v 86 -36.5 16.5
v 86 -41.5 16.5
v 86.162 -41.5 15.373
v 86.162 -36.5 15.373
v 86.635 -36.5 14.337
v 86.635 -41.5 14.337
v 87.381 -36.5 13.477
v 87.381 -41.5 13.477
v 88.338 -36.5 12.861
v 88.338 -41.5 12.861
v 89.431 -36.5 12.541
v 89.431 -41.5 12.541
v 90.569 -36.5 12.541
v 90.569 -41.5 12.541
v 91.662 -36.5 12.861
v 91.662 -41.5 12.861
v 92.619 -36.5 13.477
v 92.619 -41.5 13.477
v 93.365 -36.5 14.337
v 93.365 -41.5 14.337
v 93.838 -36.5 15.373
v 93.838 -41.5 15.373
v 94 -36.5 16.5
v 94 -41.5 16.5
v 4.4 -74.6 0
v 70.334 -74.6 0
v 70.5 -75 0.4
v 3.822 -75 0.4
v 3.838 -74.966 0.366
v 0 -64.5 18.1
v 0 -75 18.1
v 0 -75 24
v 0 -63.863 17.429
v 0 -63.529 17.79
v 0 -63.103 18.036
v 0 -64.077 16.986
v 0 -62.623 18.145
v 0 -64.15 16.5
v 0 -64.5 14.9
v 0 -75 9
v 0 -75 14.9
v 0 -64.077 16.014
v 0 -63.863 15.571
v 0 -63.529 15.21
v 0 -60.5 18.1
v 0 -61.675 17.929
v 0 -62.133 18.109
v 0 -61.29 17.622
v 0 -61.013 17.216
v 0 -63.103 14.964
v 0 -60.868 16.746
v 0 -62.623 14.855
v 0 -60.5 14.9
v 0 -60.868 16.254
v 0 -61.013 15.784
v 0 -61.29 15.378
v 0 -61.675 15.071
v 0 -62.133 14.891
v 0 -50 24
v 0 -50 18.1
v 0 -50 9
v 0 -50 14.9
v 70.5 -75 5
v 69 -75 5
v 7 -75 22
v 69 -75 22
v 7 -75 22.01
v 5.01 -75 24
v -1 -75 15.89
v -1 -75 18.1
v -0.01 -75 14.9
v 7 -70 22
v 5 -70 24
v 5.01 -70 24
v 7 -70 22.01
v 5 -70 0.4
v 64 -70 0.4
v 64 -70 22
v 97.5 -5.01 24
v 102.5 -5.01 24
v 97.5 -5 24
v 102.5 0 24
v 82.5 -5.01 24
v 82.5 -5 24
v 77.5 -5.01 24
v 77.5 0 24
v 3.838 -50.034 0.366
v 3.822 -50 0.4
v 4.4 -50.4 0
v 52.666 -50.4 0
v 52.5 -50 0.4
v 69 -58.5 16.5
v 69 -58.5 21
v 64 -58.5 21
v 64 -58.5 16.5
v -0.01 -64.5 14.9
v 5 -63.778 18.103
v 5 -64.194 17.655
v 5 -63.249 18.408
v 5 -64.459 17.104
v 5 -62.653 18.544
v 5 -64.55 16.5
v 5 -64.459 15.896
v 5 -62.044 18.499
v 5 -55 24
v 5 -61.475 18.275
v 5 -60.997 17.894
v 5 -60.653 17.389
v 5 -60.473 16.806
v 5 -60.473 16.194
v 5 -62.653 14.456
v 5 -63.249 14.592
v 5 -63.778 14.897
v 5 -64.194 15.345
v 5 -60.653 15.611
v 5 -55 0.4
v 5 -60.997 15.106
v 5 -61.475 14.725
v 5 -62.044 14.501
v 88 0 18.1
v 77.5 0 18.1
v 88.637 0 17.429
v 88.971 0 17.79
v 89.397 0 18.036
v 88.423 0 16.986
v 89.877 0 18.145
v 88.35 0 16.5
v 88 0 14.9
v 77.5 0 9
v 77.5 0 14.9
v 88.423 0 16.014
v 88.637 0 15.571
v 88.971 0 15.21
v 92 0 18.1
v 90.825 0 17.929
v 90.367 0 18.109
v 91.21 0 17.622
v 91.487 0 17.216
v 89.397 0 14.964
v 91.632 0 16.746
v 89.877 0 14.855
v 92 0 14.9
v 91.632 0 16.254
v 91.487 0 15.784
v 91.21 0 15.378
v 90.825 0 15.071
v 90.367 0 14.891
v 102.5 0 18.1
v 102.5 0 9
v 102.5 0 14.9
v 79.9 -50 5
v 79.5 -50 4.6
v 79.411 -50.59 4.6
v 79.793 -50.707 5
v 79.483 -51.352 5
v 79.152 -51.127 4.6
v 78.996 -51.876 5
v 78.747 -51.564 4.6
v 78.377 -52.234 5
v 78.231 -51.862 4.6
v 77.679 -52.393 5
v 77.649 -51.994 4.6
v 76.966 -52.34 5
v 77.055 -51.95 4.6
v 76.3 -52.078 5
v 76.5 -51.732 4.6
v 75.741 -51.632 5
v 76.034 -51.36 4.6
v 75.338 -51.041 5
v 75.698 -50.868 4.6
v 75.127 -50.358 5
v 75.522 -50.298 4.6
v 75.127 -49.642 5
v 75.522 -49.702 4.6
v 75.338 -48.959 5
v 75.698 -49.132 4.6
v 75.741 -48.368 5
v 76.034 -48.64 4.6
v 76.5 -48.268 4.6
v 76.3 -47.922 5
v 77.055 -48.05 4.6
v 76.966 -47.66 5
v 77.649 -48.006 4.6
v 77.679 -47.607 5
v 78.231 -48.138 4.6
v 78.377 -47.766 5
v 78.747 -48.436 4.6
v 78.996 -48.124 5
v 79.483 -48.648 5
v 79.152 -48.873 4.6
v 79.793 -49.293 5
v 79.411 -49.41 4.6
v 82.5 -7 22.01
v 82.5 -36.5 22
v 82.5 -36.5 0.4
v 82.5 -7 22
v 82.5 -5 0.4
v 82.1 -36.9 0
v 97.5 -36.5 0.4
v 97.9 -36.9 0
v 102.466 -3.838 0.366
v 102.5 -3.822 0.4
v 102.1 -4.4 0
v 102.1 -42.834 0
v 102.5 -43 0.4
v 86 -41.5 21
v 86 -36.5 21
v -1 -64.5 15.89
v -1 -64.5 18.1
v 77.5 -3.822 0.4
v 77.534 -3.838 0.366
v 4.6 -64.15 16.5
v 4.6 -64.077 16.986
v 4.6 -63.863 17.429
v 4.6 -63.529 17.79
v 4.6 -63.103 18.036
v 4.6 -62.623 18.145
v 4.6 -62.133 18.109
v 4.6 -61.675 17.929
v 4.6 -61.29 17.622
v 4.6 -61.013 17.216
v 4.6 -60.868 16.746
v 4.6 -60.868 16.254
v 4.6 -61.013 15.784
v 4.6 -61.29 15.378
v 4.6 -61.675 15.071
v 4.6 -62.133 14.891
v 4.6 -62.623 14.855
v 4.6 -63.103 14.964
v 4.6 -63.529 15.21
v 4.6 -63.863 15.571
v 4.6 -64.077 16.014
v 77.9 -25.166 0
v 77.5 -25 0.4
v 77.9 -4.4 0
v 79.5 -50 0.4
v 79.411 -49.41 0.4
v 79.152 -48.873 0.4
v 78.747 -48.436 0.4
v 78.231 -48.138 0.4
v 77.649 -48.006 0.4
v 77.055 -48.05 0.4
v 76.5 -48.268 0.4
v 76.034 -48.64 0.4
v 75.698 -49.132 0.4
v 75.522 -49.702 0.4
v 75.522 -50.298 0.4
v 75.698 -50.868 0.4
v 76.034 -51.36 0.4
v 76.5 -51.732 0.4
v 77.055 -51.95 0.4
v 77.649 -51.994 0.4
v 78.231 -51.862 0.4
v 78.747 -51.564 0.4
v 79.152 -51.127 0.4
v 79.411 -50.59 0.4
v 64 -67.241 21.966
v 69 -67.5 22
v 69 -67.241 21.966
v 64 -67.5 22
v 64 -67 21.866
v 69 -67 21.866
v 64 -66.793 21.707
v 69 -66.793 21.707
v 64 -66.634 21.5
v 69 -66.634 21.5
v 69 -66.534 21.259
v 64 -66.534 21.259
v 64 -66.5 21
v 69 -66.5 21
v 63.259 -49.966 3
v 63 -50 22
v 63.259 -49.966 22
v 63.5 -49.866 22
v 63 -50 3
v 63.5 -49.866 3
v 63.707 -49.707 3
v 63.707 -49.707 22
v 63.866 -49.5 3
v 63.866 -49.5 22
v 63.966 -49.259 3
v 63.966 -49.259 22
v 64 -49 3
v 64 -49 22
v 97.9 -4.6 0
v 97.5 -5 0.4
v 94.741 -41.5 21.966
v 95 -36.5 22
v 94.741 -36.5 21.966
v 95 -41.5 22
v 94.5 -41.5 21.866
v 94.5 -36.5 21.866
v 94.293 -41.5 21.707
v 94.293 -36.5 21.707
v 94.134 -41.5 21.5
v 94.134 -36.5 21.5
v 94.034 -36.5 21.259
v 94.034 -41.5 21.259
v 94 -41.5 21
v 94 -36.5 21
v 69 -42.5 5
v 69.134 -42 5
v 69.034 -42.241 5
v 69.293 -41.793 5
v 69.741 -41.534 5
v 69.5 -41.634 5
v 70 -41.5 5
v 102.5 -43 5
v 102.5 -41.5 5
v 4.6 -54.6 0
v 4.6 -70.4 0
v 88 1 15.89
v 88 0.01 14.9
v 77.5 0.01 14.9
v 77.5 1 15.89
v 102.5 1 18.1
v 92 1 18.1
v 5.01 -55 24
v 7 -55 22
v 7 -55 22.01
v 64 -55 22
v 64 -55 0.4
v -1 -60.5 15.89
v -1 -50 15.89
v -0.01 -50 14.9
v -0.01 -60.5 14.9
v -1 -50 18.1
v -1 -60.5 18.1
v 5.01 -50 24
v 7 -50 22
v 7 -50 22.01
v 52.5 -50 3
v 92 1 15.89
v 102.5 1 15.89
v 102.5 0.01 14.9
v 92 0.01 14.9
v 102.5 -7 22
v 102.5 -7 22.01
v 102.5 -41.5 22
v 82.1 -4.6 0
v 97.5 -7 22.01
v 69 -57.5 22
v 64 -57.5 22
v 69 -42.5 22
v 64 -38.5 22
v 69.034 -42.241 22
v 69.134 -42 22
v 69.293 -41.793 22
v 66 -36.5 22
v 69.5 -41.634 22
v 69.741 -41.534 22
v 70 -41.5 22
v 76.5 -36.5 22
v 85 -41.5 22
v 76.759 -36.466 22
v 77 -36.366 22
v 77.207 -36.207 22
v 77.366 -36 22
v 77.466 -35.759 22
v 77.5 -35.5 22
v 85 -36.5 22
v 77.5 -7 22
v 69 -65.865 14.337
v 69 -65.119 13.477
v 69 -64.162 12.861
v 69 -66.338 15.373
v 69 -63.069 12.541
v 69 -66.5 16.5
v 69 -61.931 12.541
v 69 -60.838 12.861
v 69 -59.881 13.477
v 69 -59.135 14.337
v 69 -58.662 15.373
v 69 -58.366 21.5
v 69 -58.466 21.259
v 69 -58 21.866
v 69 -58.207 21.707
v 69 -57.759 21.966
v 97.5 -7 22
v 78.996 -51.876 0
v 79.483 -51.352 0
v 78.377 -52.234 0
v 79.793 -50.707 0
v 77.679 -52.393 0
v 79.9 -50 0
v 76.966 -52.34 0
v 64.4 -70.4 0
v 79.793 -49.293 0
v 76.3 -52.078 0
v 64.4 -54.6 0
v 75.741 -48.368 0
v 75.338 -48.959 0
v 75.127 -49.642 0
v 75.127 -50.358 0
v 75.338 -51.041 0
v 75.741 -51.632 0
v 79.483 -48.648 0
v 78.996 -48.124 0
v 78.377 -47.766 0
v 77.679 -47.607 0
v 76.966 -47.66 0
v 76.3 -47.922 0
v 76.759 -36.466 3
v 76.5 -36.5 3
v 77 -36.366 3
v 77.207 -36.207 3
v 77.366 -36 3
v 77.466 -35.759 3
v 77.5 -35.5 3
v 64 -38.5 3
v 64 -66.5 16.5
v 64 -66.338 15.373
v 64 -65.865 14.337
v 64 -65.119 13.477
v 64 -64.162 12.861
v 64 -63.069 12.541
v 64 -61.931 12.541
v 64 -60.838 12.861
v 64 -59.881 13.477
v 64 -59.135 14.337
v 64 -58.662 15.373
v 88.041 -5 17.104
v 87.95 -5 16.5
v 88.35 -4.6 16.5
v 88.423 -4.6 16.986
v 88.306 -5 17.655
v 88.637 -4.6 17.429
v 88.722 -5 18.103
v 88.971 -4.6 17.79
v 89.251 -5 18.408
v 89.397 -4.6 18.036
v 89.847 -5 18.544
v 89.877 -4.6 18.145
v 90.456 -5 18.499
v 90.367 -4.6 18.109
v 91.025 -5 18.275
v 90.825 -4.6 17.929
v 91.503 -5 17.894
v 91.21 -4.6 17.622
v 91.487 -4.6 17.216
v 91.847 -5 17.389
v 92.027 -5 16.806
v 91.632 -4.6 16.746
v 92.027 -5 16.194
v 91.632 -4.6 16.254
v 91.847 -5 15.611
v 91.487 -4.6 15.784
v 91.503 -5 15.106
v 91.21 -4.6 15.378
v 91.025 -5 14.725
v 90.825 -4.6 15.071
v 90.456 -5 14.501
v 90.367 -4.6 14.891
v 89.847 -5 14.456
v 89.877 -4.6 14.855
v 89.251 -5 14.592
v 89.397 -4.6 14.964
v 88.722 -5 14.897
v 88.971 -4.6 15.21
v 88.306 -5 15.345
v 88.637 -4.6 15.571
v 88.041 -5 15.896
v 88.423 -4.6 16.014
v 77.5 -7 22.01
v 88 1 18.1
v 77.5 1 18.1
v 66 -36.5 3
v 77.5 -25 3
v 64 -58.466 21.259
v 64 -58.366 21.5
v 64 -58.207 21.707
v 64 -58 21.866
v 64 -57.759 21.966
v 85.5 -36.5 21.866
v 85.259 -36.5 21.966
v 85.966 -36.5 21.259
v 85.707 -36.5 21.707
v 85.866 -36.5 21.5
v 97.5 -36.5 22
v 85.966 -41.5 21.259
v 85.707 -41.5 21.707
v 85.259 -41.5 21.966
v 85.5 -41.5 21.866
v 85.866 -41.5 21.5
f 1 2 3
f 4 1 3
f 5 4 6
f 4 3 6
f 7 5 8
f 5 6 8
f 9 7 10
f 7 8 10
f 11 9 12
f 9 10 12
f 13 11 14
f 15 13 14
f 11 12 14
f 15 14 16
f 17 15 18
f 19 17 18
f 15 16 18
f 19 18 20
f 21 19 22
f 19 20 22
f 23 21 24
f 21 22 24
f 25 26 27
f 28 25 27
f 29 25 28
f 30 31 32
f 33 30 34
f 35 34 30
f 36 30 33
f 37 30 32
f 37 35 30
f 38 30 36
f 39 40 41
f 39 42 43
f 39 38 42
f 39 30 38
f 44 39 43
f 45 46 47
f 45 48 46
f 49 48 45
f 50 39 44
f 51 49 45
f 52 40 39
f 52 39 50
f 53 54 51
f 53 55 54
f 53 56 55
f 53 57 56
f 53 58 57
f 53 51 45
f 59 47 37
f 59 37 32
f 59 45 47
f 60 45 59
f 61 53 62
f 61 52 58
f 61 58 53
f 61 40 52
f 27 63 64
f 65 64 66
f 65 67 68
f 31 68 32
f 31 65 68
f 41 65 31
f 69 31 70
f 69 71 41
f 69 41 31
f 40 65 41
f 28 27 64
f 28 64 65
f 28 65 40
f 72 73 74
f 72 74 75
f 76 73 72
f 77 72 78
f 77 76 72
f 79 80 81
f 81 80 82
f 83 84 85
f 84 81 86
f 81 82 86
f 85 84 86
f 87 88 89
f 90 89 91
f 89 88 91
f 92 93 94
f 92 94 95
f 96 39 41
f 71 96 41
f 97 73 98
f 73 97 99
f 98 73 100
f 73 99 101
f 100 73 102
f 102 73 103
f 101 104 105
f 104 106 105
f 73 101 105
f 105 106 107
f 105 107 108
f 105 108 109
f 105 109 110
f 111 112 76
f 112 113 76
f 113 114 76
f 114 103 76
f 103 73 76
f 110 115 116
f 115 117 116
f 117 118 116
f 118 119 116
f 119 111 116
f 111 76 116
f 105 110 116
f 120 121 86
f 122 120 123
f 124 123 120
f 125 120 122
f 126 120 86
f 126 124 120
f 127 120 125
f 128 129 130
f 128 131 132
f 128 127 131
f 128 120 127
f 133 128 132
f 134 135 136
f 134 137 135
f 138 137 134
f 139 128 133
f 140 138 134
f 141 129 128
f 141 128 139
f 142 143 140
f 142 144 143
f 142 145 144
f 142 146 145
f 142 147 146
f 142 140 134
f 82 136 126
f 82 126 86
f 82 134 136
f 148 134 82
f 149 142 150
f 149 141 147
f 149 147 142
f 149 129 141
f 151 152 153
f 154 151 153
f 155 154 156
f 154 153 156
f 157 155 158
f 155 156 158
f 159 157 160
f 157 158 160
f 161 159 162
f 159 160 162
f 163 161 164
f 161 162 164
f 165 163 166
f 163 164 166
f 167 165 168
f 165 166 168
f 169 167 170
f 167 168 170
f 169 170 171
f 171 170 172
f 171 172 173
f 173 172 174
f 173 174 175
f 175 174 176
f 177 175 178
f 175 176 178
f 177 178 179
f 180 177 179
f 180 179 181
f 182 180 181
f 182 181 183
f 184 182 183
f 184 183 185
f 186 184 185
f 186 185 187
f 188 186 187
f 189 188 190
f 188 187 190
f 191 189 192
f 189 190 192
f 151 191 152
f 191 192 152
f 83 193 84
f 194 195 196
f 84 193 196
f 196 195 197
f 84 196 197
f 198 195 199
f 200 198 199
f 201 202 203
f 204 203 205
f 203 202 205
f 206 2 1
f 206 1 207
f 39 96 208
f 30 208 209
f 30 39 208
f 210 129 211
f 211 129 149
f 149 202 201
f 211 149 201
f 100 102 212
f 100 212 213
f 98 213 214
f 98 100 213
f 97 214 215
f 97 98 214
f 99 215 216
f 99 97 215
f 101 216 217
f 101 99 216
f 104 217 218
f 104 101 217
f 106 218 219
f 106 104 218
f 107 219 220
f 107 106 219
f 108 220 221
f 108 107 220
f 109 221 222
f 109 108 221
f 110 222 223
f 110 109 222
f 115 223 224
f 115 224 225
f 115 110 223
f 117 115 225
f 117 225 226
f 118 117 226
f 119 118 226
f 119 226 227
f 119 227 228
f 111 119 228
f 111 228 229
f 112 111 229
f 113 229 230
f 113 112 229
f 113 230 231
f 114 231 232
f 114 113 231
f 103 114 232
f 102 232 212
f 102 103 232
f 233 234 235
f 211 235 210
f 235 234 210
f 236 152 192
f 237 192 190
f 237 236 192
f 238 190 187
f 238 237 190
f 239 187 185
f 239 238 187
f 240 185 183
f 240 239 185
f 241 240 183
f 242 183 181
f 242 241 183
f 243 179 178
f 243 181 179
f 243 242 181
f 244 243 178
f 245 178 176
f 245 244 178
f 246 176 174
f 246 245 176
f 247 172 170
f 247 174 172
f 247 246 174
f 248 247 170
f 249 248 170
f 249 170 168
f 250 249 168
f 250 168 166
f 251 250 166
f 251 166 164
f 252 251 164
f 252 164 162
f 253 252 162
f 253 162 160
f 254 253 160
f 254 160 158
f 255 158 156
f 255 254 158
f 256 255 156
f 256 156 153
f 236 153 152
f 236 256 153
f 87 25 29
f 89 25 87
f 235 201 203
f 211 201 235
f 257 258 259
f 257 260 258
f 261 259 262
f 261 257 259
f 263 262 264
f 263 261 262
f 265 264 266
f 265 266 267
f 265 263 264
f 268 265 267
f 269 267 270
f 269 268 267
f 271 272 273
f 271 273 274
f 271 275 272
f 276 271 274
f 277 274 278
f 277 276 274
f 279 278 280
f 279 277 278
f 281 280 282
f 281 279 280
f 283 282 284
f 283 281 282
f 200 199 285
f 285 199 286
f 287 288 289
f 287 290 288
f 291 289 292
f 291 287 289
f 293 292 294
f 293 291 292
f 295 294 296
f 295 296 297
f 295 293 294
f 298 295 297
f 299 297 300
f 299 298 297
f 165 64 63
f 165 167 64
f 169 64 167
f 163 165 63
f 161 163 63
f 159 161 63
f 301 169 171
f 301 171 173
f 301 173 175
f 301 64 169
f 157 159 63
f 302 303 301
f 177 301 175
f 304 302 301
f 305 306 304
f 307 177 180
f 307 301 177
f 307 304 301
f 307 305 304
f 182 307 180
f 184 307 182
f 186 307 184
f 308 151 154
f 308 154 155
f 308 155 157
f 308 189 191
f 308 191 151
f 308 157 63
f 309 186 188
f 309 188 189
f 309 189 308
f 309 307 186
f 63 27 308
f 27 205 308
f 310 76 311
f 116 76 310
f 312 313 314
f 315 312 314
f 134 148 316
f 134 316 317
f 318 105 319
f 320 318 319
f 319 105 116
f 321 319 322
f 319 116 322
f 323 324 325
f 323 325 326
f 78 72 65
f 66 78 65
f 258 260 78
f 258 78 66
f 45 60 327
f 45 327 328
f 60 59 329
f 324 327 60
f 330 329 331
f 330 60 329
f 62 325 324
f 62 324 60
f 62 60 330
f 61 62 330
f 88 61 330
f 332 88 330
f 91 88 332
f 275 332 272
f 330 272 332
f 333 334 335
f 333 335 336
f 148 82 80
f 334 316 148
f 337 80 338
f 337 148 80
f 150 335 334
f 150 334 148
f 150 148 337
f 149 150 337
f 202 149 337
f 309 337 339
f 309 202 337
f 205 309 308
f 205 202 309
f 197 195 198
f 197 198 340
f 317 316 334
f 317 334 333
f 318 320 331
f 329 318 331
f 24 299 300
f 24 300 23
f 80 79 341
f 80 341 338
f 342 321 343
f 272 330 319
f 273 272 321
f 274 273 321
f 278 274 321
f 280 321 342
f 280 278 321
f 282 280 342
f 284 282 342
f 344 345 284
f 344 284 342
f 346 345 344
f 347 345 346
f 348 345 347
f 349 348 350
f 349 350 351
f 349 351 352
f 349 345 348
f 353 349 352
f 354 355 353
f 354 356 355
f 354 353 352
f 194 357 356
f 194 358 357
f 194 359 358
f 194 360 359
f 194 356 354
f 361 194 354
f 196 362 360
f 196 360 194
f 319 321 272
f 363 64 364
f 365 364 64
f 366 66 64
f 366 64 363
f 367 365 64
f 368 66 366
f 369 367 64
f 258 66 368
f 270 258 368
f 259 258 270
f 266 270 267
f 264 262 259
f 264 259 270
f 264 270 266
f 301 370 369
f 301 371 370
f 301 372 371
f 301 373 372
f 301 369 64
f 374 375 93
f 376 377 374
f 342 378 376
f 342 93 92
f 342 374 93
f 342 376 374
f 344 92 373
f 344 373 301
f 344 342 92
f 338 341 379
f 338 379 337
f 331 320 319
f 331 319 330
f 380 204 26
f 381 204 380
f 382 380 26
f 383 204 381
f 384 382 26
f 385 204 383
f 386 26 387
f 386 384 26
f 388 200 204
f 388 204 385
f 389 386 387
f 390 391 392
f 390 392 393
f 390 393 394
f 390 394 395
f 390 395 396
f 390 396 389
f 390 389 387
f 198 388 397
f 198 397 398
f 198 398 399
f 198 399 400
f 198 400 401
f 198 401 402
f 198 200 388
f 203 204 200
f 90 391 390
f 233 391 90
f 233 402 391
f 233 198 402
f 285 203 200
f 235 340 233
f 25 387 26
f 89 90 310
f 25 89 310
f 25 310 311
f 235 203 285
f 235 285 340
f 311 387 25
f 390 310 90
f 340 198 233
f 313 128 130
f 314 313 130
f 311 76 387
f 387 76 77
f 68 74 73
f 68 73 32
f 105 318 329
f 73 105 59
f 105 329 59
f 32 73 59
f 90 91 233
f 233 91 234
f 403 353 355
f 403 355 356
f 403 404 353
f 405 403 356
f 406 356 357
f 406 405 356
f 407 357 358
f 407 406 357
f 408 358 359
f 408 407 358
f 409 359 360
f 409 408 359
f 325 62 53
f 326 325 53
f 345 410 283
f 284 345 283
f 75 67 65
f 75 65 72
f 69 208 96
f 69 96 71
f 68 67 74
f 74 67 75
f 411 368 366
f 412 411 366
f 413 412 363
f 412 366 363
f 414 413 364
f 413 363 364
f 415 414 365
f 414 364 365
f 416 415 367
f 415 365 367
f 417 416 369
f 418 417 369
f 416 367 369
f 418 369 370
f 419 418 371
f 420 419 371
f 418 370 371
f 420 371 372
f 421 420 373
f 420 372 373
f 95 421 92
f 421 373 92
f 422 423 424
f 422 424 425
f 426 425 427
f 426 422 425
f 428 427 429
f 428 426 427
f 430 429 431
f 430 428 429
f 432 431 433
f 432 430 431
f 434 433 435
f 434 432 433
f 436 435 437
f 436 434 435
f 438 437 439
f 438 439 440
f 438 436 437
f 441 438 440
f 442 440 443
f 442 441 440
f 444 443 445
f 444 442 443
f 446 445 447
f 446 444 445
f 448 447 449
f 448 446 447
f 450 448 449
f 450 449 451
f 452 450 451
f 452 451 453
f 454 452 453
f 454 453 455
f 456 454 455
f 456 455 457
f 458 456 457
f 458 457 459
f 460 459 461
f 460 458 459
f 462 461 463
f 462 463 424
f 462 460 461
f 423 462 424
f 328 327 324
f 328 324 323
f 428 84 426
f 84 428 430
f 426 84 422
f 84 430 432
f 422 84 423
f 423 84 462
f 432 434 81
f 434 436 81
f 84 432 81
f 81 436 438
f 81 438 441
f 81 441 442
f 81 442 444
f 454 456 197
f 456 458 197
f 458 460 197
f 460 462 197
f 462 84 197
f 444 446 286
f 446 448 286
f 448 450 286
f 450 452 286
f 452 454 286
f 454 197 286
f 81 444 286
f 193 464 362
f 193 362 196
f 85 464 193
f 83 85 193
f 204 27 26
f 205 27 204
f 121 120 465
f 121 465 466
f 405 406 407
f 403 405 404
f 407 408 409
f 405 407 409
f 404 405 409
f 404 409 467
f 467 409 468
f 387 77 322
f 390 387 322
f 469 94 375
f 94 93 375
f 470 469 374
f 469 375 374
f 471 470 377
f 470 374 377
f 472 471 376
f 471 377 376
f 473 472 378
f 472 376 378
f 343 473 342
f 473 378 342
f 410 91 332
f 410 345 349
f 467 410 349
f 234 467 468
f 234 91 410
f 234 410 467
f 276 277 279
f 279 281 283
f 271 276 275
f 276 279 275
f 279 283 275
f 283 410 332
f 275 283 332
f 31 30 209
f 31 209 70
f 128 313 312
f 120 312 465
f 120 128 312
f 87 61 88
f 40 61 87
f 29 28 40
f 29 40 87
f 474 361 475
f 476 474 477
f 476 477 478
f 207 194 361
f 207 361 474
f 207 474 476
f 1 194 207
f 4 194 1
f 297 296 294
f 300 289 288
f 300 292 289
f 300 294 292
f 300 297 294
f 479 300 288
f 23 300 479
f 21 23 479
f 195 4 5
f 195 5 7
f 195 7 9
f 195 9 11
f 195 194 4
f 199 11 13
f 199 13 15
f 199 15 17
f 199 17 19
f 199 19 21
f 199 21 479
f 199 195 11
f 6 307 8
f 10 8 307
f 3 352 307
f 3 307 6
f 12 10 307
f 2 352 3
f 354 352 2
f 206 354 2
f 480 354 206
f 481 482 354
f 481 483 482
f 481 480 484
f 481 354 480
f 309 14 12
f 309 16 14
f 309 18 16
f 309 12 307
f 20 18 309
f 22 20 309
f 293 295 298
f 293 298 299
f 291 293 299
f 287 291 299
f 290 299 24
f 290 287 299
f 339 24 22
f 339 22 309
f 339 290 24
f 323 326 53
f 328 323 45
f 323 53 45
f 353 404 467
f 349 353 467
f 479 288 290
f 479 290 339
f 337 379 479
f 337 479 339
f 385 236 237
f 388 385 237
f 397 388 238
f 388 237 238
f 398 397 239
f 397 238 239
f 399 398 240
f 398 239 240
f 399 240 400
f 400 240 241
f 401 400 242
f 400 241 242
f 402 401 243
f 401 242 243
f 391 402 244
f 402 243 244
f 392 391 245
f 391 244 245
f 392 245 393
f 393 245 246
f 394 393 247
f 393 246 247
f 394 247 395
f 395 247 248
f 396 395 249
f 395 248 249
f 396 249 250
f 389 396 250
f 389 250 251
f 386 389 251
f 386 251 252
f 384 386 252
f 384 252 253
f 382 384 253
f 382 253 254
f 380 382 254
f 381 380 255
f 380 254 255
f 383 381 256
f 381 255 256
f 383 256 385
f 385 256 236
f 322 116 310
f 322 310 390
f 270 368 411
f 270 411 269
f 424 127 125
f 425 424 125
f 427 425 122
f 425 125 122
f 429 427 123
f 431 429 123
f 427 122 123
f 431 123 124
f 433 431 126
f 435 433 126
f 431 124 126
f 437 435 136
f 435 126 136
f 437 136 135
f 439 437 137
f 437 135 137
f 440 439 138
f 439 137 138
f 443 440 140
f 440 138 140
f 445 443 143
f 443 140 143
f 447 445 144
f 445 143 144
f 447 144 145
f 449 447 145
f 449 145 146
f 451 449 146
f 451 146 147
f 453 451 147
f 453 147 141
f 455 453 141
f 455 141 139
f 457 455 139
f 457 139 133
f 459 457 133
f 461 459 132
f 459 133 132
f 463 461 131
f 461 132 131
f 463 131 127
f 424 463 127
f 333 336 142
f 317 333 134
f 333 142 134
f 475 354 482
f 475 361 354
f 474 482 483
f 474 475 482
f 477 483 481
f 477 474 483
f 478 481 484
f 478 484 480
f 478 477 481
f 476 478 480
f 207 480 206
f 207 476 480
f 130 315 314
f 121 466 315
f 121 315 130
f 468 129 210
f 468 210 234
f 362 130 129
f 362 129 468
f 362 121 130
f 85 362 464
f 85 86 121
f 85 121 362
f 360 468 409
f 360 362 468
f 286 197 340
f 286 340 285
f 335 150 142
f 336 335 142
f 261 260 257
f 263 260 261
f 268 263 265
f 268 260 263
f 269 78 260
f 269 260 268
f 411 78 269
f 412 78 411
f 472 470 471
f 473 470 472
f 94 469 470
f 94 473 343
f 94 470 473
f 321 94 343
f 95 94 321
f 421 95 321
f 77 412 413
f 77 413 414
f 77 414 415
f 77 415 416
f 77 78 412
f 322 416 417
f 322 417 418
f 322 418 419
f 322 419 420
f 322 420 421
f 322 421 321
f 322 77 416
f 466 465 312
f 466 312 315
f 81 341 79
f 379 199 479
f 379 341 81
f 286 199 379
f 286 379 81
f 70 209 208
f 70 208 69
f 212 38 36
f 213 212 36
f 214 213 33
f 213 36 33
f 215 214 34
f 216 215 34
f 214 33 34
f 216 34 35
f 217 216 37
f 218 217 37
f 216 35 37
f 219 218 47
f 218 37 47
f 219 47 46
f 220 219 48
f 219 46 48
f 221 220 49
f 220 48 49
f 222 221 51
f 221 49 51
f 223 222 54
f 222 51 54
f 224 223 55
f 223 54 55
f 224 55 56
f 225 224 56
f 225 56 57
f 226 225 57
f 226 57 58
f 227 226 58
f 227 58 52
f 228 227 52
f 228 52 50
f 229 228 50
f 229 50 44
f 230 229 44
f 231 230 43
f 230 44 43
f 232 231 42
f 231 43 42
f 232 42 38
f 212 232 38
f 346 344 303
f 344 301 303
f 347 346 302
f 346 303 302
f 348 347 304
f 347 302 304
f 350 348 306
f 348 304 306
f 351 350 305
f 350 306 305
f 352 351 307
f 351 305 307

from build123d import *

# Parameters (mm, degrees)
SKETCH005_R        = 2
SKETCH005_W        = 59
SKETCH005_H        = 15
SKETCH005_W_2      = 15
SKETCH005_H_2      = 31.5
PAD002_DEPTH       = 24
SKETCH007_W        = 33.5
SKETCH007_H        = 33.5
POCKET003_DEPTH    = 19
CHAMFER002004_SIZE = 32
SKETCH008_W        = 95.5
SKETCH008_H        = 68
POCKET004_DEPTH    = 2
CHAMFER002005_SIZE = 1.99
POCKET005_DEPTH    = 75.001
POCKET006_DEPTH    = 102.501
POCKET007_DEPTH    = 19
SKETCH012_R        = 1.65
POCKET008_DEPTH    = 5
SKETCH013_R        = 1.65
POCKET009_DEPTH    = 5
SKETCH014_W        = 10.5
SKETCH014_H        = 3.2
PAD003_DEPTH       = 1
SKETCH015_W        = 10.5
SKETCH015_H        = 3.2
PAD004_DEPTH       = 1
CHAMFER002006_SIZE = 0.99
POCKET010_DEPTH    = 5
POCKET011_DEPTH    = 5
CHAMFER002007_SIZE = 0.4
FILLET001002_R     = 1
CHAMFER002008_SIZE = 0.4


with BuildPart() as part:
    # Sketch005 → Pad002 (new body)
    with BuildSketch(Plane.XY):
        Polygon((52.5, -50), (77.5, -25), (77.5, 0), (102.5, 0), (102.5, -75), (0, -75), (0, -50), align=None)
        with Locations((77.5, -50)):
            Circle(SKETCH005_R, mode=Mode.SUBTRACT)
        with Locations((34.5, -62.5)):
            Rectangle(SKETCH005_W, SKETCH005_H, mode=Mode.SUBTRACT)
        with Locations((90, -20.75)):
            Rectangle(SKETCH005_W_2, SKETCH005_H_2, mode=Mode.SUBTRACT)
    extrude(amount=PAD002_DEPTH)

    # Sketch007 (on Face18 of Pad002) → Pocket003 (cut)
    with BuildSketch(Plane.XY.offset(24)):
        with Locations((85.75, -58.25)):
            Rectangle(SKETCH007_W, SKETCH007_H)
    extrude(amount=-POCKET003_DEPTH, mode=Mode.SUBTRACT)

    # Chamfer002004
    chamfer002004_edges = [part.edges().sort_by_distance(p)[0] for p in [
        (102.5, -75, 2.5),
    ]]
    chamfer(chamfer002004_edges, length=CHAMFER002004_SIZE)

    # Sketch008 (on Face6 of Chamfer002004) → Pocket004 (cut)
    with BuildSketch(Plane.XY.offset(24)):
        with Locations((54.75, -41)):
            Rectangle(SKETCH008_W, SKETCH008_H)
    extrude(amount=-POCKET004_DEPTH, mode=Mode.SUBTRACT)

    # Chamfer002005
    chamfer002005_edges = [part.edges().sort_by_distance(p)[0] for p in [
        (7, -72.5, 24),
        (7, -52.5, 24),
        (80, -7, 24),
        (100, -7, 24),
    ]]
    chamfer(chamfer002005_edges, length=CHAMFER002005_SIZE)

    # Sketch009 (on Face1 of Chamfer002005) → Pocket005 (cut, through all)
    with BuildSketch(Plane.XZ.offset(75)):
        Polygon((0, 9), (4, 0), (0, 0), align=None)
    extrude(amount=-POCKET005_DEPTH, mode=Mode.SUBTRACT)

    # Sketch010 (on Face17 of Pocket005) → Pocket006 (cut, through all)
    with BuildSketch(Plane.YZ.offset(102.5)):
        Polygon((0, 9), (-4, 0), (0, 0), align=None)
    extrude(amount=-POCKET006_DEPTH, mode=Mode.SUBTRACT)

    # Sketch011 (on Face10 of Pocket006) → Pocket007 (cut)
    with BuildSketch(Plane.XY.offset(22)):
        Polygon((64, -38.5), (64, -50), (52.5, -50), align=None)
        Polygon((77.5, -25), (77.5, -36.5), (66, -36.5), align=None)
    extrude(amount=-POCKET007_DEPTH, mode=Mode.SUBTRACT)

    # Sketch012 (on Face4 of Pocket007) → Pocket008 (cut)
    with BuildSketch(Plane(origin=(0, 0, 0), x_dir=(0, -1, 0), z_dir=(-1, 0, 0))):
        with Locations((62.5, 16.5)):
            Circle(SKETCH012_R)
    extrude(amount=-POCKET008_DEPTH, mode=Mode.SUBTRACT)

    # Sketch013 (on Face37 of Pocket008) → Pocket009 (cut)
    with BuildSketch(Plane(origin=(0, 0, 0), x_dir=(-1, 0, 0), z_dir=(0, 1, 0))):
        with Locations((-90, 16.5)):
            Circle(SKETCH013_R)
    extrude(amount=-POCKET009_DEPTH, mode=Mode.SUBTRACT)

    # Sketch014 (on Face37 of Pocket009) → Pad003 (join)
    with BuildSketch(Plane(origin=(0, 0, 0), x_dir=(-1, 0, 0), z_dir=(0, 1, 0))):
        with Locations((-97.25, 16.5)):
            Rectangle(SKETCH014_W, SKETCH014_H)
        with Locations((-82.75, 16.5)):
            Rectangle(SKETCH014_W, SKETCH014_H)
    extrude(amount=PAD003_DEPTH)

    # Sketch015 (on Face4 of Pad003) → Pad004 (join)
    with BuildSketch(Plane(origin=(0, 0, 0), x_dir=(0, -1, 0), z_dir=(-1, 0, 0))):
        with Locations((55.25, 16.5)):
            Rectangle(SKETCH015_W, SKETCH015_H)
        with Locations((69.75, 16.5)):
            Rectangle(SKETCH015_W, SKETCH015_H)
    extrude(amount=PAD004_DEPTH)

    # Chamfer002006
    chamfer002006_edges = [part.edges().sort_by_distance(p)[0] for p in [
        (-1, -55.25, 14.9),
        (-1, -69.75, 14.9),
        (97.25, 1, 14.9),
        (82.75, 1, 14.9),
    ]]
    chamfer(chamfer002006_edges, length=CHAMFER002006_SIZE)

    # Sketch016 (on Face15 of Chamfer002006) → Pocket010 (cut)
    with BuildSketch(Plane.YZ.offset(69)):
        with BuildLine():
            ThreePointArc((-66.5, 16.5), (-62.5, 12.5), (-58.5, 16.5))
            Line((-58.5, 24), (-58.5, 16.5))
            Line((-66.5, 24), (-58.5, 24))
            Line((-66.5, 16.5), (-66.5, 24))
        make_face()
    extrude(amount=-POCKET010_DEPTH, mode=Mode.SUBTRACT)

    # Sketch017 (on Face37 of Pocket010) → Pocket011 (cut)
    with BuildSketch(Plane.XZ.offset(41.5)):
        with BuildLine():
            ThreePointArc((86, 16.5), (90, 12.5), (94, 16.5))
            Line((94, 24), (94, 16.5))
            Line((86, 24), (94, 24))
            Line((86, 16.5), (86, 24))
        make_face()
    extrude(amount=-POCKET011_DEPTH, mode=Mode.SUBTRACT)

    # Chamfer002007
    chamfer002007_edges = [part.edges().sort_by_distance(p)[0] for p in [
        (102.5, -23.5, 0),
        (90, -4, 0),
        (77.5, -14.5, 0),
        (65, -37.5, 0),
        (28.25, -50, 0),
        (4, -62.5, 0),
        (37.25, -75, 0),
        (86.5, -59, 0),
        (75.5, -50, 0),
        (5, -62.5, 0),
        (34.5, -70, 0),
        (34.5, -55, 0),
        (64, -62.5, 0),
        (82.5, -20.75, 0),
        (90, -36.5, 0),
        (90, -5, 0),
        (97.5, -20.75, 0),
        (75.5, -50, 5),
    ]]
    chamfer(chamfer002007_edges, length=CHAMFER002007_SIZE)

    # Fillet001002
    fillet001002_edges = [part.edges().sort_by_distance(p)[0] for p in [
        (66.5, -66.5, 22),
        (66.5, -58.5, 22),
        (86, -39, 22),
        (94, -39, 22),
        (69, -41.5, 13.5),
        (64, -50, 12.5),
        (77.5, -36.5, 12.5),
    ]]
    fillet(fillet001002_edges, radius=FILLET001002_R)

    # Chamfer002008
    chamfer002008_edges = [part.edges().sort_by_distance(p)[0] for p in [
        (5, -60.85, 16.5),
        (91.65, -5, 16.5),
    ]]
    chamfer(chamfer002008_edges, length=CHAMFER002008_SIZE)


solid = part.part
